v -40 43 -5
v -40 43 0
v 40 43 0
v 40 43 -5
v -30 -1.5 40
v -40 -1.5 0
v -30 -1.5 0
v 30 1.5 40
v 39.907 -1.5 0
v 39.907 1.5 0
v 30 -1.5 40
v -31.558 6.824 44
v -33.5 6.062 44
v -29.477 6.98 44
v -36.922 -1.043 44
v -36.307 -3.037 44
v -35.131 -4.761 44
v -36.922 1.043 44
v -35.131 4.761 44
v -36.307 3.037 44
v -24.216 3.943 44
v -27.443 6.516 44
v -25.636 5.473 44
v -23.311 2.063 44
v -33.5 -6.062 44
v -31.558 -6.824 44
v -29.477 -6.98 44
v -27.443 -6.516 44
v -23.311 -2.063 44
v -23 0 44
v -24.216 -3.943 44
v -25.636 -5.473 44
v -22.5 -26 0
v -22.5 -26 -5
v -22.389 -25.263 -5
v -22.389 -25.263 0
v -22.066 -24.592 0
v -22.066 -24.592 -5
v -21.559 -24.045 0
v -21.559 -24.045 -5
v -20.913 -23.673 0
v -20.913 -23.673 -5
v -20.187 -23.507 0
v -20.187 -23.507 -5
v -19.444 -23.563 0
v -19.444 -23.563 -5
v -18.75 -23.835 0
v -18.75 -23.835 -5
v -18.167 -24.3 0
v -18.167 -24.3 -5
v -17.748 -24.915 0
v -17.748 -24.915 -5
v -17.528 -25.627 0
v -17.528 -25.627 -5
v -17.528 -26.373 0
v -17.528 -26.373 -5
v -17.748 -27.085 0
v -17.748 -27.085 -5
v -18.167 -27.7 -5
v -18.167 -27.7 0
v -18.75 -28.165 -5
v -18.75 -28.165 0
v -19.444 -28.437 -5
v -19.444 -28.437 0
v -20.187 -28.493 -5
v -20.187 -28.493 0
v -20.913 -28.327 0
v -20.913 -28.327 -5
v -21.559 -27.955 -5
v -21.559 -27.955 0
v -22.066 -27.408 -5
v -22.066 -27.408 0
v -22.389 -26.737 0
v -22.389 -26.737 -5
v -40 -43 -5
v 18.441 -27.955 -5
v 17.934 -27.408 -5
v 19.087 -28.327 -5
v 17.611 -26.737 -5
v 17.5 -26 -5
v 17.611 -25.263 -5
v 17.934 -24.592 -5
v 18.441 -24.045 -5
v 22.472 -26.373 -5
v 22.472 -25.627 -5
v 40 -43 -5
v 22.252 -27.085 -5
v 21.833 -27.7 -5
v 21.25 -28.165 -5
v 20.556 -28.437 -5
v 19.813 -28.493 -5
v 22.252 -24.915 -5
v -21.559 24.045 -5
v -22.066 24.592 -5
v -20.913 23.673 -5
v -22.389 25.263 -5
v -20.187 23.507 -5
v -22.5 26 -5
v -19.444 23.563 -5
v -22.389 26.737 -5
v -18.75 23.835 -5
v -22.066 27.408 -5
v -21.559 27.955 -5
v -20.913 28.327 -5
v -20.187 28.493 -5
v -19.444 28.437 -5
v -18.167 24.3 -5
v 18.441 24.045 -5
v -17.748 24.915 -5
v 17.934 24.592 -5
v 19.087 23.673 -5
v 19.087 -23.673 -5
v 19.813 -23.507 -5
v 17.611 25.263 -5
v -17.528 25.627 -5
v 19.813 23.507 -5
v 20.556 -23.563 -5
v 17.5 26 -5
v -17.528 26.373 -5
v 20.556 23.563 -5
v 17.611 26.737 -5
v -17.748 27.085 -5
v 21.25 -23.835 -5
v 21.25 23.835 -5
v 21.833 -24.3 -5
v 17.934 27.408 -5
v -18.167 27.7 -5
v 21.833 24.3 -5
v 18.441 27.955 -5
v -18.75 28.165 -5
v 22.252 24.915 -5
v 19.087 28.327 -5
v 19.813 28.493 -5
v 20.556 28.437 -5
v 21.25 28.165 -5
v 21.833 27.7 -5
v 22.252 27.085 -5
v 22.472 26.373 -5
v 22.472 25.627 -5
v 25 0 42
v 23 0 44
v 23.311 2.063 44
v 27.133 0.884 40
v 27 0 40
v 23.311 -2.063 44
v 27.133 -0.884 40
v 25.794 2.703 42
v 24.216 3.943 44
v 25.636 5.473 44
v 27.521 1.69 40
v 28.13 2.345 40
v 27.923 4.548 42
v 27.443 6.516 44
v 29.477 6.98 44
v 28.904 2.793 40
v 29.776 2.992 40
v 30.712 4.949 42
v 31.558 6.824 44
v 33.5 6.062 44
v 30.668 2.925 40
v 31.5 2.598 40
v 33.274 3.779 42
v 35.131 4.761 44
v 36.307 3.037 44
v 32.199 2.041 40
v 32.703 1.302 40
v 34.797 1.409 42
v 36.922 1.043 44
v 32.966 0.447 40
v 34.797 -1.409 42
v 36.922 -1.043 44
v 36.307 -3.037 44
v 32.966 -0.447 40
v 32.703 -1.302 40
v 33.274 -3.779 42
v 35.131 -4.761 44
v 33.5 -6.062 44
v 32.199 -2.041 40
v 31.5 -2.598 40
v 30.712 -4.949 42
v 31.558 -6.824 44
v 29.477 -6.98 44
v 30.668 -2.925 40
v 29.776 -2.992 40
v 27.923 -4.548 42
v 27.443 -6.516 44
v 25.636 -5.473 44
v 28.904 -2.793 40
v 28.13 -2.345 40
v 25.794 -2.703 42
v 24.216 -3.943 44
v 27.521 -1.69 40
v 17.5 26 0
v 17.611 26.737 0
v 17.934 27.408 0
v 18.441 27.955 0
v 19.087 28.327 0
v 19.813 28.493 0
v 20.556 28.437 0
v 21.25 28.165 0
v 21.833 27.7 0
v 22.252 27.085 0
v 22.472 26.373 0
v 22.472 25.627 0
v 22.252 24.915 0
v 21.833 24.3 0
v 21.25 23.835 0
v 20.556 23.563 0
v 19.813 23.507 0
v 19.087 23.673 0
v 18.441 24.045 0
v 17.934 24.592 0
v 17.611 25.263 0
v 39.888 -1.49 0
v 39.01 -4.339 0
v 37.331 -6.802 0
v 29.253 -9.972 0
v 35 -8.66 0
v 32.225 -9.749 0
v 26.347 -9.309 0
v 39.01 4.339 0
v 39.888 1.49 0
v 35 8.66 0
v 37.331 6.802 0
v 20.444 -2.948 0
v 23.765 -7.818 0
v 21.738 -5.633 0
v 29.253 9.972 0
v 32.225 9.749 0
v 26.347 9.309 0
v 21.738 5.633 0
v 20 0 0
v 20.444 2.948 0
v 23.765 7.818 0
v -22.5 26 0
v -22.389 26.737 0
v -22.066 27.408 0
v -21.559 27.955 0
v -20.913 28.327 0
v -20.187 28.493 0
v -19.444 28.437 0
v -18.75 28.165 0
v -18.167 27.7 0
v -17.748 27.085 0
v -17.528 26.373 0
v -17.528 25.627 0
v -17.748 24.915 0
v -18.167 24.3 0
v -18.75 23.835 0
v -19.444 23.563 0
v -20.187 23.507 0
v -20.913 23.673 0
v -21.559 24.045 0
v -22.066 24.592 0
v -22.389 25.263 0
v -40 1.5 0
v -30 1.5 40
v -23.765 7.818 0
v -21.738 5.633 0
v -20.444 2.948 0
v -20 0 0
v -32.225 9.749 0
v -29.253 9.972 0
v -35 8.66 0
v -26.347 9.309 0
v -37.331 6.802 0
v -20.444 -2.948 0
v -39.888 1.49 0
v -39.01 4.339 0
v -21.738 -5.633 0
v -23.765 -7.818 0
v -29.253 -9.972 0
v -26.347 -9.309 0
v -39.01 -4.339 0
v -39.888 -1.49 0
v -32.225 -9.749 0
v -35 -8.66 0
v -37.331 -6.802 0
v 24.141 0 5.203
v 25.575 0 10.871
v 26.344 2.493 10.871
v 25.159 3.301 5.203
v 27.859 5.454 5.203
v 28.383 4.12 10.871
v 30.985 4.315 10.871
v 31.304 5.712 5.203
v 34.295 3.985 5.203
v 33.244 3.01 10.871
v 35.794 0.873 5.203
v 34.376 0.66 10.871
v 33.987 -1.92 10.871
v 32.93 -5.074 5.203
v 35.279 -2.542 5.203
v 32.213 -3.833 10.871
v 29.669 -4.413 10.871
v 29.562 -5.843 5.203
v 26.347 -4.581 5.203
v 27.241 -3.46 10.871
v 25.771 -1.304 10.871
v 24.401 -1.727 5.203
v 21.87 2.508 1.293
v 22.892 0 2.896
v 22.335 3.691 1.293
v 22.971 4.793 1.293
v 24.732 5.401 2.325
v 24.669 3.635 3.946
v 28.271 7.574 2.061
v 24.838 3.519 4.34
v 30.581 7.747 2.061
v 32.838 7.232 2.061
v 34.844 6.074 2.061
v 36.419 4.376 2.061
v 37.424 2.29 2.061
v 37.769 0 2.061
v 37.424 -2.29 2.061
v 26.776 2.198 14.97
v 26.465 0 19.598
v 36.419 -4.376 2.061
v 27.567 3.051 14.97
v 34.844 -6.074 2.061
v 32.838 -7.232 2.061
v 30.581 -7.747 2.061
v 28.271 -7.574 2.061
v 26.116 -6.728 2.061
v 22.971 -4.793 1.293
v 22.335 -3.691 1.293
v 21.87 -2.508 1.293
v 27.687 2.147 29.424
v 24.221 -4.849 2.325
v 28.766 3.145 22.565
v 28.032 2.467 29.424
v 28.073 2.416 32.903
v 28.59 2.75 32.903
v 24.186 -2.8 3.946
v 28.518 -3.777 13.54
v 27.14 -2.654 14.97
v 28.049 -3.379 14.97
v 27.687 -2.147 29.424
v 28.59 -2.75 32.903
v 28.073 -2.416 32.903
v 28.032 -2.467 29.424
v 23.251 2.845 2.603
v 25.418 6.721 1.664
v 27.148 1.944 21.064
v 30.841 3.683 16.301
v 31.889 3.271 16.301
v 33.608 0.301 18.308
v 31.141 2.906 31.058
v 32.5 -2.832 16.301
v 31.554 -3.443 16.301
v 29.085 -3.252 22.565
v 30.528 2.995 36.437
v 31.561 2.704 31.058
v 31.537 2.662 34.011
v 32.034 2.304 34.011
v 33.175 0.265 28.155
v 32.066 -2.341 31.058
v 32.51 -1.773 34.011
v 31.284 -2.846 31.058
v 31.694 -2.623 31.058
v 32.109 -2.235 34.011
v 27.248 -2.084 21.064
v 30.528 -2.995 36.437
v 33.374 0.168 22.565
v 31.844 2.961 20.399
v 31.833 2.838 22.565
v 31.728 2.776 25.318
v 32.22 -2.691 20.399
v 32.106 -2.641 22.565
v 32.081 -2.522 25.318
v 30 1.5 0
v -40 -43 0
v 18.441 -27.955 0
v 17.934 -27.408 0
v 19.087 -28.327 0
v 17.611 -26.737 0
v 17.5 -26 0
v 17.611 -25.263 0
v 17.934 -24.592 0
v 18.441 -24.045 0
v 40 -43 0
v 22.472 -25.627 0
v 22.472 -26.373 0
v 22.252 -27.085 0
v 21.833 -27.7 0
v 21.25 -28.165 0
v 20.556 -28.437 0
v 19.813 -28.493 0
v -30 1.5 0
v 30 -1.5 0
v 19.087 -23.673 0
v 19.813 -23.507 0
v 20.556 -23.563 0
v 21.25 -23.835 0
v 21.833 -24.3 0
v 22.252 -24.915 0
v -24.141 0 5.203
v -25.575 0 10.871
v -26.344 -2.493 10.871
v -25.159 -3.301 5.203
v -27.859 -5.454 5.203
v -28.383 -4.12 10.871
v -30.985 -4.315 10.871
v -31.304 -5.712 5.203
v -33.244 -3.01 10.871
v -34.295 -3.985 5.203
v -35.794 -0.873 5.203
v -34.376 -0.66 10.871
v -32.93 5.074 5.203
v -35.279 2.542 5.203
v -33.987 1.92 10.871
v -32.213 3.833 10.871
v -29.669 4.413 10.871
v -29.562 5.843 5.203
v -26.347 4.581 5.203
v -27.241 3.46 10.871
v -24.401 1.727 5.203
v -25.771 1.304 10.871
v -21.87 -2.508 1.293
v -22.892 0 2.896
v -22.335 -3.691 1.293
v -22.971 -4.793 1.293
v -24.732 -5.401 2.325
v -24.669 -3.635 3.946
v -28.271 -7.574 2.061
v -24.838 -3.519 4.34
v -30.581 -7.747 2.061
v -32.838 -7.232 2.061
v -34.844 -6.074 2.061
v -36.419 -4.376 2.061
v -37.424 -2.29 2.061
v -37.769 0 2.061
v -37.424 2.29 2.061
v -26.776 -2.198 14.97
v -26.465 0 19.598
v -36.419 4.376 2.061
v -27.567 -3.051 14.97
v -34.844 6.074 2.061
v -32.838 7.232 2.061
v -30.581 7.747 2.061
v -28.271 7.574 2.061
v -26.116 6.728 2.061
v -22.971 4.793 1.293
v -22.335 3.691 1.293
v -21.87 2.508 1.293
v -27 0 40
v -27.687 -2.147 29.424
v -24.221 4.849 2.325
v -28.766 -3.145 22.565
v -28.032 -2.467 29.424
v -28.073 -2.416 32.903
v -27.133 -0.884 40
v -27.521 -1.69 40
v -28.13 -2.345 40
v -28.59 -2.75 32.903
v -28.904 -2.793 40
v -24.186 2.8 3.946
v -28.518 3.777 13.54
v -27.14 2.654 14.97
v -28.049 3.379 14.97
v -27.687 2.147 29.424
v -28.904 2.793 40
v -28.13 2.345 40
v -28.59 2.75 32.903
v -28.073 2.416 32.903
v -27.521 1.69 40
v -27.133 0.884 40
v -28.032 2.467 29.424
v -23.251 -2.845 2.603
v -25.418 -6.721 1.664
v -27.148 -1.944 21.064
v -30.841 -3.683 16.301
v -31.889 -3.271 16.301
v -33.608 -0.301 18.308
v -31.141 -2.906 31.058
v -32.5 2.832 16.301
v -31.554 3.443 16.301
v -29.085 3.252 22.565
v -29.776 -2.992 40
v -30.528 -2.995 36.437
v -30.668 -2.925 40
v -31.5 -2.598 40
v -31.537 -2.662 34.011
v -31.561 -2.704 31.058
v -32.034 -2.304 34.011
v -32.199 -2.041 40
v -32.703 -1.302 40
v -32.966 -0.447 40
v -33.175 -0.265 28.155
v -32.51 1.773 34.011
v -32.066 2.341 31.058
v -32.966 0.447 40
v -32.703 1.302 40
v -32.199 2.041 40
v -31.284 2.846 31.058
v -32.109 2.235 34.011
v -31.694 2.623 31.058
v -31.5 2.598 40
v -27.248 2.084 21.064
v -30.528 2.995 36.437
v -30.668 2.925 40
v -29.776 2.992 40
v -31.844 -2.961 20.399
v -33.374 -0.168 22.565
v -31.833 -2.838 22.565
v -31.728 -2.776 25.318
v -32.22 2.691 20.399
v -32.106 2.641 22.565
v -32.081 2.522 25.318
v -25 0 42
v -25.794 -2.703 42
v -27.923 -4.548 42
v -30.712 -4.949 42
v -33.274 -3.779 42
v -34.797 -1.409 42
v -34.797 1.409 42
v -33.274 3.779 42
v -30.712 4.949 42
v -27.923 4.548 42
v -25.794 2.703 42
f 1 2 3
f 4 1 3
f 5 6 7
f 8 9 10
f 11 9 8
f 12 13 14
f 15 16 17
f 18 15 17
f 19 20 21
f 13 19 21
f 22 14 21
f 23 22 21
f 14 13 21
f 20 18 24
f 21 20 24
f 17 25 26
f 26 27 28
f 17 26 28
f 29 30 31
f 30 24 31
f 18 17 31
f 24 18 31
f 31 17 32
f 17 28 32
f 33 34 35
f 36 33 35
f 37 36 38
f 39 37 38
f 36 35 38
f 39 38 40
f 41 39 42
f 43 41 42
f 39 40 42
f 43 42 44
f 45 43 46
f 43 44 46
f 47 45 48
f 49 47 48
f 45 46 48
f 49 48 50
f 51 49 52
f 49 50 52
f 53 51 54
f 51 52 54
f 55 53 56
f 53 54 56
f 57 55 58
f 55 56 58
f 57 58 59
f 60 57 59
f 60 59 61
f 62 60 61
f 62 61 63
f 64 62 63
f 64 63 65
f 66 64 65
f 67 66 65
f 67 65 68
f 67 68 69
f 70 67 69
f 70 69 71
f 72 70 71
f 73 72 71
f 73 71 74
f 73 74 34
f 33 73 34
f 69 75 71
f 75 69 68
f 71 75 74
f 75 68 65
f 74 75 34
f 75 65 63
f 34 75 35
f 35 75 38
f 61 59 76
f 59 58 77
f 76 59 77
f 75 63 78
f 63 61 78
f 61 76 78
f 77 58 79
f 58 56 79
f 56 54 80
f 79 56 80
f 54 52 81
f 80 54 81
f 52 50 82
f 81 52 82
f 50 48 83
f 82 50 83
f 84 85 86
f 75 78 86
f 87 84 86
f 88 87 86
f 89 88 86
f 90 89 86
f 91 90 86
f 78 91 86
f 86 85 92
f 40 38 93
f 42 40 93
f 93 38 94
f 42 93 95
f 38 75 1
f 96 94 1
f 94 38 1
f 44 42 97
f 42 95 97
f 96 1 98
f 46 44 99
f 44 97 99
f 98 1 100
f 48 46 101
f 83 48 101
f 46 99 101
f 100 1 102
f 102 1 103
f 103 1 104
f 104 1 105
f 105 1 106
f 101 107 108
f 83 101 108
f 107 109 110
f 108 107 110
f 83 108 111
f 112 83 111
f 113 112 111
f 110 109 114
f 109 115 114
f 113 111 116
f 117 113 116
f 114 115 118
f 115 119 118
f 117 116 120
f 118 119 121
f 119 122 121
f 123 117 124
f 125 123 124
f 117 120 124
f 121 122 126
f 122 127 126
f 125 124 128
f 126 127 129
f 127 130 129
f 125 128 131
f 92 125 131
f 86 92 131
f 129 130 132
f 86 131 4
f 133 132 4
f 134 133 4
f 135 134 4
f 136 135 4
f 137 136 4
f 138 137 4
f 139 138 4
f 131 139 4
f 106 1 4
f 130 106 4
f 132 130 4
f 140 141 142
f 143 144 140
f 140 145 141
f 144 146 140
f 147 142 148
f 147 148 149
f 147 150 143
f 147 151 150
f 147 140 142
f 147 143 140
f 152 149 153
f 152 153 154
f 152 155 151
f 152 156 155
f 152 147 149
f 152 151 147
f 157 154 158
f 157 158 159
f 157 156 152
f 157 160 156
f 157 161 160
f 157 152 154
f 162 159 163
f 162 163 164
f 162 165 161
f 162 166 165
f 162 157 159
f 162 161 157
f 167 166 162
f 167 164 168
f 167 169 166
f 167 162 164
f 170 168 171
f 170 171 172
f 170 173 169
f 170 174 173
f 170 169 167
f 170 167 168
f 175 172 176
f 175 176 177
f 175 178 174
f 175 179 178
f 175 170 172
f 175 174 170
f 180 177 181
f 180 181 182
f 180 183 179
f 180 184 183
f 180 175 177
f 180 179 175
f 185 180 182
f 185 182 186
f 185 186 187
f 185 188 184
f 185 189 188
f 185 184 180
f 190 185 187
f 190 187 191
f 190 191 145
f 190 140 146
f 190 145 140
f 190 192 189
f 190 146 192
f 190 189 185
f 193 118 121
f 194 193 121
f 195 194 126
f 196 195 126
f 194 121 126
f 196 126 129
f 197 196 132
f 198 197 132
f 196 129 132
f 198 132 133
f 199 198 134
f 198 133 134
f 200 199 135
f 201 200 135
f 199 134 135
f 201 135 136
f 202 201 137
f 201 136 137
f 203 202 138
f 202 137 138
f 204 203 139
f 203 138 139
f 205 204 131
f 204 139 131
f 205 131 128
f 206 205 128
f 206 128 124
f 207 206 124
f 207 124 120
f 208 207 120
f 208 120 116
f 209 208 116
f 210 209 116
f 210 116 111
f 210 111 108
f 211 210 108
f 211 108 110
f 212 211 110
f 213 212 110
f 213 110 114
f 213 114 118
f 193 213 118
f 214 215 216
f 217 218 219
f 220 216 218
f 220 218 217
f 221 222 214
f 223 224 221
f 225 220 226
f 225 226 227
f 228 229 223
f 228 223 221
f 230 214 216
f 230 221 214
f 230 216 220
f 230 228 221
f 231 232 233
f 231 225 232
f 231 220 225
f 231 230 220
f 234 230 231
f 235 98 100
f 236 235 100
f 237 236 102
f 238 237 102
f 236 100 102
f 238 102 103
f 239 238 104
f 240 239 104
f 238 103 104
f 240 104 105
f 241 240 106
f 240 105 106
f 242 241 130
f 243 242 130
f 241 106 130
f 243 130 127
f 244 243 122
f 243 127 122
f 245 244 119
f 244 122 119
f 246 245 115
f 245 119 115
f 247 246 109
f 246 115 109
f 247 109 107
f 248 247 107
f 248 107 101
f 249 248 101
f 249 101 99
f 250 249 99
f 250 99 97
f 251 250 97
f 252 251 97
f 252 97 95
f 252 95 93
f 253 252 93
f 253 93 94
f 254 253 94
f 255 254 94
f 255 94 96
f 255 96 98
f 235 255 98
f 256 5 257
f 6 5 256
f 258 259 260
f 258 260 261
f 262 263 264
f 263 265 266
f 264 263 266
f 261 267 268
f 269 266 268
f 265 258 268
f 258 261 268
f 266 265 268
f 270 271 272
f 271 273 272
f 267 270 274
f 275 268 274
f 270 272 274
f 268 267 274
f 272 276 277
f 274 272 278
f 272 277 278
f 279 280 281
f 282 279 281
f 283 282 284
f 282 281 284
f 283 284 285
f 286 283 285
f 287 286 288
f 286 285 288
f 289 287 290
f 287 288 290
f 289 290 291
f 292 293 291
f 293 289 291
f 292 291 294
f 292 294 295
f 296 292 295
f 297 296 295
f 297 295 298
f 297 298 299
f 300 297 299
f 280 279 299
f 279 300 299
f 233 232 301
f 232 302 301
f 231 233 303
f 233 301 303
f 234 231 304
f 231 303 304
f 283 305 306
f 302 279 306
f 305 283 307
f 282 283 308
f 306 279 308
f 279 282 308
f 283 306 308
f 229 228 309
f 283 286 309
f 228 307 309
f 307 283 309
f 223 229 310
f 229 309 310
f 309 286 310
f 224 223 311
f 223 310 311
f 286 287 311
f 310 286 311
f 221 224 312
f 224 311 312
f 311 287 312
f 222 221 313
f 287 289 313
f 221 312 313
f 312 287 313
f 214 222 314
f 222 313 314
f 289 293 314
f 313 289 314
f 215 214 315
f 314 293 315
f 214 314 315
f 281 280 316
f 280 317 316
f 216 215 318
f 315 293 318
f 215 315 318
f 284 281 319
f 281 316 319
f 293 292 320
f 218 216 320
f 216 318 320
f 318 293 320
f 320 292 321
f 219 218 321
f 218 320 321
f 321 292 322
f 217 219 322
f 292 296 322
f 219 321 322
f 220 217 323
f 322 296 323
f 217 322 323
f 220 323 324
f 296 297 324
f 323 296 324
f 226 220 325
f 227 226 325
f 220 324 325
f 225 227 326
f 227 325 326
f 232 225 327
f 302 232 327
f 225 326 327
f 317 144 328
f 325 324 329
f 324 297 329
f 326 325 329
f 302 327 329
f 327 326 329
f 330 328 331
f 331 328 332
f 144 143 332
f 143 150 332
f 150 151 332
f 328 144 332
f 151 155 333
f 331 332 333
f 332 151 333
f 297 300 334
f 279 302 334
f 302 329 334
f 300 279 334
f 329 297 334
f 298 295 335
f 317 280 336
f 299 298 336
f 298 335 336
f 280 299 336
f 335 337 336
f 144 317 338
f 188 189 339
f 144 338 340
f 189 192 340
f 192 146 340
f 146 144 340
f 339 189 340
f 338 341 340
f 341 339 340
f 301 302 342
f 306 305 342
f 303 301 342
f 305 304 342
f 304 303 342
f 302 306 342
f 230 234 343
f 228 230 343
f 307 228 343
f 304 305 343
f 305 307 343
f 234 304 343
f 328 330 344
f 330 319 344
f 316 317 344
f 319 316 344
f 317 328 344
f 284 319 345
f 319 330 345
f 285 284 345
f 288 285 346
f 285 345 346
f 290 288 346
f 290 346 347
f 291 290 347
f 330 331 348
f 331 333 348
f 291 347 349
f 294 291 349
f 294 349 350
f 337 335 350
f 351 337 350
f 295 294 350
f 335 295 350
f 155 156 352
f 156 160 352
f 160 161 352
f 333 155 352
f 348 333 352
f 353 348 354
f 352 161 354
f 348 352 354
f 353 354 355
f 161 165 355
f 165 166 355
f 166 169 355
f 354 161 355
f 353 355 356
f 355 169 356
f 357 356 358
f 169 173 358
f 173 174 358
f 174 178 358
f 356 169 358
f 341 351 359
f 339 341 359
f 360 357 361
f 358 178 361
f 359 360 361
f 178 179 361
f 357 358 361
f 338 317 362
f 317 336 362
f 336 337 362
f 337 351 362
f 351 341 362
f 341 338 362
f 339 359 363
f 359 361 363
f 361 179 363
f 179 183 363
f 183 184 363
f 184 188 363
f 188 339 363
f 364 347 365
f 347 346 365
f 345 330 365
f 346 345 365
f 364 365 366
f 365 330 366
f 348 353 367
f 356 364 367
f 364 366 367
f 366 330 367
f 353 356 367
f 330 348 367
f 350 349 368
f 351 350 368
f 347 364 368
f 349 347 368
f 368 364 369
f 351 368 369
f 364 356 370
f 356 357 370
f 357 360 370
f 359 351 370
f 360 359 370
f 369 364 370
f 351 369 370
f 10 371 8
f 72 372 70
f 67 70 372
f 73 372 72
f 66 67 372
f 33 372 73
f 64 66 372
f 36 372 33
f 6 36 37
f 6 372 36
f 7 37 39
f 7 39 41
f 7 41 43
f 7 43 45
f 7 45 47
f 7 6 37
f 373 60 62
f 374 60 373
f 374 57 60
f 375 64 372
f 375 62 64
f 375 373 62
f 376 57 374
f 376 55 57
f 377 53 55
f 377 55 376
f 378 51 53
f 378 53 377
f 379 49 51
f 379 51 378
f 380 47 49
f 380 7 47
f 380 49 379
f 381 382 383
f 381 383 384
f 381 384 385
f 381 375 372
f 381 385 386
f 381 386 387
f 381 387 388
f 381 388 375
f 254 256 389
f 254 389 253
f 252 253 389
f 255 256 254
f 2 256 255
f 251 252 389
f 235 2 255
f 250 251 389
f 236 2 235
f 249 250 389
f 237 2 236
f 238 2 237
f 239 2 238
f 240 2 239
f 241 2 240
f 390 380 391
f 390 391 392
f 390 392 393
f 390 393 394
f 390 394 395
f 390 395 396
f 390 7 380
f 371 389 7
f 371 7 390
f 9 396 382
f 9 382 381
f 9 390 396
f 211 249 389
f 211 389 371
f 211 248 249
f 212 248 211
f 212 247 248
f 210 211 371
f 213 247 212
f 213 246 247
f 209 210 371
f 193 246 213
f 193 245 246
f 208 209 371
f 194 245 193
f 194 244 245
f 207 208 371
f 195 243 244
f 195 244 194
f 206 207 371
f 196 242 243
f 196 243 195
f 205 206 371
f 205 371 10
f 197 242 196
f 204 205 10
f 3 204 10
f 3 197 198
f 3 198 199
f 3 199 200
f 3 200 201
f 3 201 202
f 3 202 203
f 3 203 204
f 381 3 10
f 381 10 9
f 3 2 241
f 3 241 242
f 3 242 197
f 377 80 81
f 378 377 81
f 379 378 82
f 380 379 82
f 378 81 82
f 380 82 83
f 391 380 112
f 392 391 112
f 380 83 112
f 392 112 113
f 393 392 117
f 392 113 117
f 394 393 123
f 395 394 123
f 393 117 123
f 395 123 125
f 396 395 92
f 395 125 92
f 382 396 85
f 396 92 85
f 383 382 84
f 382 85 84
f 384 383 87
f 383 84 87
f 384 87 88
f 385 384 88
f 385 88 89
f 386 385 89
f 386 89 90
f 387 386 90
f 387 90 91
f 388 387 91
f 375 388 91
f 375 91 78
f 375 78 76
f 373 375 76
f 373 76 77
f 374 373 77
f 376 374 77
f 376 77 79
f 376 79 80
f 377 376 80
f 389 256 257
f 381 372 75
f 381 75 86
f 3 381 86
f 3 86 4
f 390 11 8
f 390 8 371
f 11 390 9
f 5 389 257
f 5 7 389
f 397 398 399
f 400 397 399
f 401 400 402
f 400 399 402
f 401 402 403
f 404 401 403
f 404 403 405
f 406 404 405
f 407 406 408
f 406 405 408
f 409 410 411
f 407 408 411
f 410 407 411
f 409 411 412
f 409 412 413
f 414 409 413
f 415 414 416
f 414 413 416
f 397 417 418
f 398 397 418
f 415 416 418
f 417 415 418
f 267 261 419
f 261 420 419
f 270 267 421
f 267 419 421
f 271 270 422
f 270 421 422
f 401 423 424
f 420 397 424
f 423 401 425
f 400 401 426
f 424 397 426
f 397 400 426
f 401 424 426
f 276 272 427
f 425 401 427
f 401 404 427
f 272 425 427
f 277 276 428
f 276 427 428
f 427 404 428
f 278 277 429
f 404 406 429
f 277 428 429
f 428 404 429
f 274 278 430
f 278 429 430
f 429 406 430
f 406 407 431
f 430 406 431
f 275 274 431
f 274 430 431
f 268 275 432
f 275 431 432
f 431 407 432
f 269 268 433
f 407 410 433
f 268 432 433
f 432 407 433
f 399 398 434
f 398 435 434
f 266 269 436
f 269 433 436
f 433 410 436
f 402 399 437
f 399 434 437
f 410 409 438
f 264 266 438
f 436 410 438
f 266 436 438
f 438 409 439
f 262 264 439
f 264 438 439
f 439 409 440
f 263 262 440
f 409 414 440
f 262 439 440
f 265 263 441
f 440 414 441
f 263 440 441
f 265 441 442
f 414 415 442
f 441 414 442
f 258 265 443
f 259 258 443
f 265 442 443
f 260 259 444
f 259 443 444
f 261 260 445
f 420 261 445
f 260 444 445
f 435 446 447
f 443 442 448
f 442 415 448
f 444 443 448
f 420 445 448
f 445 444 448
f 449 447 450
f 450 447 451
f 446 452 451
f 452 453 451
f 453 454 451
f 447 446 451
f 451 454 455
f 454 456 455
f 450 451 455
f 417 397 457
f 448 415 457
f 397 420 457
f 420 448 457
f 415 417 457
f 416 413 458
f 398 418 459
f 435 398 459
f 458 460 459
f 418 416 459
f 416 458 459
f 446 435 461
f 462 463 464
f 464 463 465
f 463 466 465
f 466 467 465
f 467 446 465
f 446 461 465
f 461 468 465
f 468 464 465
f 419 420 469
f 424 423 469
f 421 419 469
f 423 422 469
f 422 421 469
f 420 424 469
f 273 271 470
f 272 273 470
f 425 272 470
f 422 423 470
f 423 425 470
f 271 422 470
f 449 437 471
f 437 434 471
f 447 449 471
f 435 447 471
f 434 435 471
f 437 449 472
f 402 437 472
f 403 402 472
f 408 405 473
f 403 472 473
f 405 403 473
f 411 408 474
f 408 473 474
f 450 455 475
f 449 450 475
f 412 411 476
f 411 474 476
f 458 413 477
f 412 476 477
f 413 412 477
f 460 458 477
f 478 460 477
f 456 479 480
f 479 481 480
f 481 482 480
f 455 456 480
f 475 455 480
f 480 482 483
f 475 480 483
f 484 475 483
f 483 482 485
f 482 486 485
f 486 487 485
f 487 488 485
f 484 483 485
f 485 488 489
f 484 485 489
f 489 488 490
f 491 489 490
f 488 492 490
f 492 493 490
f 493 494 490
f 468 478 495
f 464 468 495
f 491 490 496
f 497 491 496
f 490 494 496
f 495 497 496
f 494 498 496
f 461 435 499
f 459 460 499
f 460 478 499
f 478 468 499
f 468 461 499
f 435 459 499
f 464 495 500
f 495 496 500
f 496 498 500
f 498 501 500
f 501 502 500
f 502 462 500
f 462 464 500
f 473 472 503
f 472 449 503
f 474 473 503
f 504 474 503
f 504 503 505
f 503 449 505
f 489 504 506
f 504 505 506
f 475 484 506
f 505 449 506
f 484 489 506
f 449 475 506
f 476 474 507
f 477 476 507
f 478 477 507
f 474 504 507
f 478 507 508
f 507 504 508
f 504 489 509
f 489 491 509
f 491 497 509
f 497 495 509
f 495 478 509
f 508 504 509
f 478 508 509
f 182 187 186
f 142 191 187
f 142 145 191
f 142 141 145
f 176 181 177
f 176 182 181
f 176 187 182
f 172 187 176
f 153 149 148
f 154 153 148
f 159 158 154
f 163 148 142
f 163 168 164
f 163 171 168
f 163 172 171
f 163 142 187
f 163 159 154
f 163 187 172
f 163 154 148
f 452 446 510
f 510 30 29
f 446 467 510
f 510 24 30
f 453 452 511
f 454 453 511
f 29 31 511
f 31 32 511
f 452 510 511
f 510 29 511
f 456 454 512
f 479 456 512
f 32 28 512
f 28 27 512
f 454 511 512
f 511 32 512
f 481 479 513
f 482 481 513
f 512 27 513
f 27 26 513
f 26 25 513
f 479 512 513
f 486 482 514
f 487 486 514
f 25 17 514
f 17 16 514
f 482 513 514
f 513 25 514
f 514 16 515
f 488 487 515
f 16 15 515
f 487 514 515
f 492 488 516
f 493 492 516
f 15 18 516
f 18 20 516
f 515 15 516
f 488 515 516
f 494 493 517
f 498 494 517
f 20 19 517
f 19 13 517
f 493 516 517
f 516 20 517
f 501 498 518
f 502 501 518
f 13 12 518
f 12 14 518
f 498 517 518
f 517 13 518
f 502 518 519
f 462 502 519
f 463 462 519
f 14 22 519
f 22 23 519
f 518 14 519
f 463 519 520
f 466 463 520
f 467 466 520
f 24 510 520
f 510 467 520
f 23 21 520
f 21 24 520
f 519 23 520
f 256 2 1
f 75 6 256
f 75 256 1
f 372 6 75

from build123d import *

# Parameters (mm, degrees)
F0_W     = 80
F0_H     = 17
F0_H_2   = 52
F5_DEPTH = 5
F6_D     = 5
F7_DEPTH = 1.5
F8_DEPTH = 1.5


with BuildPart() as f3:
    # F1 (on Front) → F3 (revolve)
    with BuildSketch(Plane.XZ):
        with BuildLine():
            add(Edge.make_bspline(
                [(-20, 0), (-21.5544057374, 1.2794487258), (-26.61671515, 5.4462921511), (-26.8431163473, 25.8567018682), (-27, 40)],
                knots=[0, 0, 0, 0, 0.3070546683, 1, 1, 1, 1], degree=3))
            Line((-27, 40), (-30, 40))
            Line((-30, 40), (-30, 0))
            Line((-30, 0), (-20, 0))
        make_face()
        Polygon((-30, 40), (-27, 40), (-23, 44), (-30, 44), align=None)
    revolve(axis=Axis((-30, 0, 20), (0, 0, -1)))


with BuildPart() as f4:
    # F1 (on Front) → F4 (revolve)
    with BuildSketch(Plane.XZ):
        with BuildLine():
            Line((30, 0), (30, 40))
            Line((30, 40), (27, 40))
            add(Edge.make_bspline(
                [(20, 0), (21.5544076314, 1.2794480444), (26.6167227969, 5.4462889088), (26.8431194806, 25.8567008448), (27, 40)],
                knots=[0, 0, 0, 0, 0.3070546935, 1, 1, 1, 1], degree=3))
            Line((20, 0), (30, 0))
        make_face()
        Polygon((27, 40), (30, 40), (30, 44), (23, 44), align=None)
    revolve(axis=Axis((30, 0, 20), (0, 0, -1)))


with BuildPart() as f5:
    # F0 (on Top) → F5 (new body)
    with BuildSketch(Plane.XY):
        with Locations((0, -34.5)):
            Rectangle(F0_W, F0_H)
        Rectangle(F0_W, F0_H_2)
        with Locations((0, 34.5)):
            Rectangle(F0_W, F0_H)
    extrude(amount=-F5_DEPTH)

    # F6 (through all)
    with Locations(Plane.XY):
        with Locations((-20, -26), (-20, 26), (20, 26), (20, -26)):
            Hole(F6_D / 2)

    # F1 (on Front) → F7 (join, symmetric)
    with BuildSketch(Plane.XZ):
        Polygon((-30, 0), (-30, 40), (-40, 0), align=None)
    extrude(amount=F7_DEPTH, both=True)

    # F1 (on Front) → F8 (join, symmetric)
    with BuildSketch(Plane.XZ):
        Polygon((39.9074889719, 0), (30, 40), (30, 0), align=None)
    extrude(amount=F8_DEPTH, both=True)


solid = Compound([f3.part, f4.part, f5.part])
